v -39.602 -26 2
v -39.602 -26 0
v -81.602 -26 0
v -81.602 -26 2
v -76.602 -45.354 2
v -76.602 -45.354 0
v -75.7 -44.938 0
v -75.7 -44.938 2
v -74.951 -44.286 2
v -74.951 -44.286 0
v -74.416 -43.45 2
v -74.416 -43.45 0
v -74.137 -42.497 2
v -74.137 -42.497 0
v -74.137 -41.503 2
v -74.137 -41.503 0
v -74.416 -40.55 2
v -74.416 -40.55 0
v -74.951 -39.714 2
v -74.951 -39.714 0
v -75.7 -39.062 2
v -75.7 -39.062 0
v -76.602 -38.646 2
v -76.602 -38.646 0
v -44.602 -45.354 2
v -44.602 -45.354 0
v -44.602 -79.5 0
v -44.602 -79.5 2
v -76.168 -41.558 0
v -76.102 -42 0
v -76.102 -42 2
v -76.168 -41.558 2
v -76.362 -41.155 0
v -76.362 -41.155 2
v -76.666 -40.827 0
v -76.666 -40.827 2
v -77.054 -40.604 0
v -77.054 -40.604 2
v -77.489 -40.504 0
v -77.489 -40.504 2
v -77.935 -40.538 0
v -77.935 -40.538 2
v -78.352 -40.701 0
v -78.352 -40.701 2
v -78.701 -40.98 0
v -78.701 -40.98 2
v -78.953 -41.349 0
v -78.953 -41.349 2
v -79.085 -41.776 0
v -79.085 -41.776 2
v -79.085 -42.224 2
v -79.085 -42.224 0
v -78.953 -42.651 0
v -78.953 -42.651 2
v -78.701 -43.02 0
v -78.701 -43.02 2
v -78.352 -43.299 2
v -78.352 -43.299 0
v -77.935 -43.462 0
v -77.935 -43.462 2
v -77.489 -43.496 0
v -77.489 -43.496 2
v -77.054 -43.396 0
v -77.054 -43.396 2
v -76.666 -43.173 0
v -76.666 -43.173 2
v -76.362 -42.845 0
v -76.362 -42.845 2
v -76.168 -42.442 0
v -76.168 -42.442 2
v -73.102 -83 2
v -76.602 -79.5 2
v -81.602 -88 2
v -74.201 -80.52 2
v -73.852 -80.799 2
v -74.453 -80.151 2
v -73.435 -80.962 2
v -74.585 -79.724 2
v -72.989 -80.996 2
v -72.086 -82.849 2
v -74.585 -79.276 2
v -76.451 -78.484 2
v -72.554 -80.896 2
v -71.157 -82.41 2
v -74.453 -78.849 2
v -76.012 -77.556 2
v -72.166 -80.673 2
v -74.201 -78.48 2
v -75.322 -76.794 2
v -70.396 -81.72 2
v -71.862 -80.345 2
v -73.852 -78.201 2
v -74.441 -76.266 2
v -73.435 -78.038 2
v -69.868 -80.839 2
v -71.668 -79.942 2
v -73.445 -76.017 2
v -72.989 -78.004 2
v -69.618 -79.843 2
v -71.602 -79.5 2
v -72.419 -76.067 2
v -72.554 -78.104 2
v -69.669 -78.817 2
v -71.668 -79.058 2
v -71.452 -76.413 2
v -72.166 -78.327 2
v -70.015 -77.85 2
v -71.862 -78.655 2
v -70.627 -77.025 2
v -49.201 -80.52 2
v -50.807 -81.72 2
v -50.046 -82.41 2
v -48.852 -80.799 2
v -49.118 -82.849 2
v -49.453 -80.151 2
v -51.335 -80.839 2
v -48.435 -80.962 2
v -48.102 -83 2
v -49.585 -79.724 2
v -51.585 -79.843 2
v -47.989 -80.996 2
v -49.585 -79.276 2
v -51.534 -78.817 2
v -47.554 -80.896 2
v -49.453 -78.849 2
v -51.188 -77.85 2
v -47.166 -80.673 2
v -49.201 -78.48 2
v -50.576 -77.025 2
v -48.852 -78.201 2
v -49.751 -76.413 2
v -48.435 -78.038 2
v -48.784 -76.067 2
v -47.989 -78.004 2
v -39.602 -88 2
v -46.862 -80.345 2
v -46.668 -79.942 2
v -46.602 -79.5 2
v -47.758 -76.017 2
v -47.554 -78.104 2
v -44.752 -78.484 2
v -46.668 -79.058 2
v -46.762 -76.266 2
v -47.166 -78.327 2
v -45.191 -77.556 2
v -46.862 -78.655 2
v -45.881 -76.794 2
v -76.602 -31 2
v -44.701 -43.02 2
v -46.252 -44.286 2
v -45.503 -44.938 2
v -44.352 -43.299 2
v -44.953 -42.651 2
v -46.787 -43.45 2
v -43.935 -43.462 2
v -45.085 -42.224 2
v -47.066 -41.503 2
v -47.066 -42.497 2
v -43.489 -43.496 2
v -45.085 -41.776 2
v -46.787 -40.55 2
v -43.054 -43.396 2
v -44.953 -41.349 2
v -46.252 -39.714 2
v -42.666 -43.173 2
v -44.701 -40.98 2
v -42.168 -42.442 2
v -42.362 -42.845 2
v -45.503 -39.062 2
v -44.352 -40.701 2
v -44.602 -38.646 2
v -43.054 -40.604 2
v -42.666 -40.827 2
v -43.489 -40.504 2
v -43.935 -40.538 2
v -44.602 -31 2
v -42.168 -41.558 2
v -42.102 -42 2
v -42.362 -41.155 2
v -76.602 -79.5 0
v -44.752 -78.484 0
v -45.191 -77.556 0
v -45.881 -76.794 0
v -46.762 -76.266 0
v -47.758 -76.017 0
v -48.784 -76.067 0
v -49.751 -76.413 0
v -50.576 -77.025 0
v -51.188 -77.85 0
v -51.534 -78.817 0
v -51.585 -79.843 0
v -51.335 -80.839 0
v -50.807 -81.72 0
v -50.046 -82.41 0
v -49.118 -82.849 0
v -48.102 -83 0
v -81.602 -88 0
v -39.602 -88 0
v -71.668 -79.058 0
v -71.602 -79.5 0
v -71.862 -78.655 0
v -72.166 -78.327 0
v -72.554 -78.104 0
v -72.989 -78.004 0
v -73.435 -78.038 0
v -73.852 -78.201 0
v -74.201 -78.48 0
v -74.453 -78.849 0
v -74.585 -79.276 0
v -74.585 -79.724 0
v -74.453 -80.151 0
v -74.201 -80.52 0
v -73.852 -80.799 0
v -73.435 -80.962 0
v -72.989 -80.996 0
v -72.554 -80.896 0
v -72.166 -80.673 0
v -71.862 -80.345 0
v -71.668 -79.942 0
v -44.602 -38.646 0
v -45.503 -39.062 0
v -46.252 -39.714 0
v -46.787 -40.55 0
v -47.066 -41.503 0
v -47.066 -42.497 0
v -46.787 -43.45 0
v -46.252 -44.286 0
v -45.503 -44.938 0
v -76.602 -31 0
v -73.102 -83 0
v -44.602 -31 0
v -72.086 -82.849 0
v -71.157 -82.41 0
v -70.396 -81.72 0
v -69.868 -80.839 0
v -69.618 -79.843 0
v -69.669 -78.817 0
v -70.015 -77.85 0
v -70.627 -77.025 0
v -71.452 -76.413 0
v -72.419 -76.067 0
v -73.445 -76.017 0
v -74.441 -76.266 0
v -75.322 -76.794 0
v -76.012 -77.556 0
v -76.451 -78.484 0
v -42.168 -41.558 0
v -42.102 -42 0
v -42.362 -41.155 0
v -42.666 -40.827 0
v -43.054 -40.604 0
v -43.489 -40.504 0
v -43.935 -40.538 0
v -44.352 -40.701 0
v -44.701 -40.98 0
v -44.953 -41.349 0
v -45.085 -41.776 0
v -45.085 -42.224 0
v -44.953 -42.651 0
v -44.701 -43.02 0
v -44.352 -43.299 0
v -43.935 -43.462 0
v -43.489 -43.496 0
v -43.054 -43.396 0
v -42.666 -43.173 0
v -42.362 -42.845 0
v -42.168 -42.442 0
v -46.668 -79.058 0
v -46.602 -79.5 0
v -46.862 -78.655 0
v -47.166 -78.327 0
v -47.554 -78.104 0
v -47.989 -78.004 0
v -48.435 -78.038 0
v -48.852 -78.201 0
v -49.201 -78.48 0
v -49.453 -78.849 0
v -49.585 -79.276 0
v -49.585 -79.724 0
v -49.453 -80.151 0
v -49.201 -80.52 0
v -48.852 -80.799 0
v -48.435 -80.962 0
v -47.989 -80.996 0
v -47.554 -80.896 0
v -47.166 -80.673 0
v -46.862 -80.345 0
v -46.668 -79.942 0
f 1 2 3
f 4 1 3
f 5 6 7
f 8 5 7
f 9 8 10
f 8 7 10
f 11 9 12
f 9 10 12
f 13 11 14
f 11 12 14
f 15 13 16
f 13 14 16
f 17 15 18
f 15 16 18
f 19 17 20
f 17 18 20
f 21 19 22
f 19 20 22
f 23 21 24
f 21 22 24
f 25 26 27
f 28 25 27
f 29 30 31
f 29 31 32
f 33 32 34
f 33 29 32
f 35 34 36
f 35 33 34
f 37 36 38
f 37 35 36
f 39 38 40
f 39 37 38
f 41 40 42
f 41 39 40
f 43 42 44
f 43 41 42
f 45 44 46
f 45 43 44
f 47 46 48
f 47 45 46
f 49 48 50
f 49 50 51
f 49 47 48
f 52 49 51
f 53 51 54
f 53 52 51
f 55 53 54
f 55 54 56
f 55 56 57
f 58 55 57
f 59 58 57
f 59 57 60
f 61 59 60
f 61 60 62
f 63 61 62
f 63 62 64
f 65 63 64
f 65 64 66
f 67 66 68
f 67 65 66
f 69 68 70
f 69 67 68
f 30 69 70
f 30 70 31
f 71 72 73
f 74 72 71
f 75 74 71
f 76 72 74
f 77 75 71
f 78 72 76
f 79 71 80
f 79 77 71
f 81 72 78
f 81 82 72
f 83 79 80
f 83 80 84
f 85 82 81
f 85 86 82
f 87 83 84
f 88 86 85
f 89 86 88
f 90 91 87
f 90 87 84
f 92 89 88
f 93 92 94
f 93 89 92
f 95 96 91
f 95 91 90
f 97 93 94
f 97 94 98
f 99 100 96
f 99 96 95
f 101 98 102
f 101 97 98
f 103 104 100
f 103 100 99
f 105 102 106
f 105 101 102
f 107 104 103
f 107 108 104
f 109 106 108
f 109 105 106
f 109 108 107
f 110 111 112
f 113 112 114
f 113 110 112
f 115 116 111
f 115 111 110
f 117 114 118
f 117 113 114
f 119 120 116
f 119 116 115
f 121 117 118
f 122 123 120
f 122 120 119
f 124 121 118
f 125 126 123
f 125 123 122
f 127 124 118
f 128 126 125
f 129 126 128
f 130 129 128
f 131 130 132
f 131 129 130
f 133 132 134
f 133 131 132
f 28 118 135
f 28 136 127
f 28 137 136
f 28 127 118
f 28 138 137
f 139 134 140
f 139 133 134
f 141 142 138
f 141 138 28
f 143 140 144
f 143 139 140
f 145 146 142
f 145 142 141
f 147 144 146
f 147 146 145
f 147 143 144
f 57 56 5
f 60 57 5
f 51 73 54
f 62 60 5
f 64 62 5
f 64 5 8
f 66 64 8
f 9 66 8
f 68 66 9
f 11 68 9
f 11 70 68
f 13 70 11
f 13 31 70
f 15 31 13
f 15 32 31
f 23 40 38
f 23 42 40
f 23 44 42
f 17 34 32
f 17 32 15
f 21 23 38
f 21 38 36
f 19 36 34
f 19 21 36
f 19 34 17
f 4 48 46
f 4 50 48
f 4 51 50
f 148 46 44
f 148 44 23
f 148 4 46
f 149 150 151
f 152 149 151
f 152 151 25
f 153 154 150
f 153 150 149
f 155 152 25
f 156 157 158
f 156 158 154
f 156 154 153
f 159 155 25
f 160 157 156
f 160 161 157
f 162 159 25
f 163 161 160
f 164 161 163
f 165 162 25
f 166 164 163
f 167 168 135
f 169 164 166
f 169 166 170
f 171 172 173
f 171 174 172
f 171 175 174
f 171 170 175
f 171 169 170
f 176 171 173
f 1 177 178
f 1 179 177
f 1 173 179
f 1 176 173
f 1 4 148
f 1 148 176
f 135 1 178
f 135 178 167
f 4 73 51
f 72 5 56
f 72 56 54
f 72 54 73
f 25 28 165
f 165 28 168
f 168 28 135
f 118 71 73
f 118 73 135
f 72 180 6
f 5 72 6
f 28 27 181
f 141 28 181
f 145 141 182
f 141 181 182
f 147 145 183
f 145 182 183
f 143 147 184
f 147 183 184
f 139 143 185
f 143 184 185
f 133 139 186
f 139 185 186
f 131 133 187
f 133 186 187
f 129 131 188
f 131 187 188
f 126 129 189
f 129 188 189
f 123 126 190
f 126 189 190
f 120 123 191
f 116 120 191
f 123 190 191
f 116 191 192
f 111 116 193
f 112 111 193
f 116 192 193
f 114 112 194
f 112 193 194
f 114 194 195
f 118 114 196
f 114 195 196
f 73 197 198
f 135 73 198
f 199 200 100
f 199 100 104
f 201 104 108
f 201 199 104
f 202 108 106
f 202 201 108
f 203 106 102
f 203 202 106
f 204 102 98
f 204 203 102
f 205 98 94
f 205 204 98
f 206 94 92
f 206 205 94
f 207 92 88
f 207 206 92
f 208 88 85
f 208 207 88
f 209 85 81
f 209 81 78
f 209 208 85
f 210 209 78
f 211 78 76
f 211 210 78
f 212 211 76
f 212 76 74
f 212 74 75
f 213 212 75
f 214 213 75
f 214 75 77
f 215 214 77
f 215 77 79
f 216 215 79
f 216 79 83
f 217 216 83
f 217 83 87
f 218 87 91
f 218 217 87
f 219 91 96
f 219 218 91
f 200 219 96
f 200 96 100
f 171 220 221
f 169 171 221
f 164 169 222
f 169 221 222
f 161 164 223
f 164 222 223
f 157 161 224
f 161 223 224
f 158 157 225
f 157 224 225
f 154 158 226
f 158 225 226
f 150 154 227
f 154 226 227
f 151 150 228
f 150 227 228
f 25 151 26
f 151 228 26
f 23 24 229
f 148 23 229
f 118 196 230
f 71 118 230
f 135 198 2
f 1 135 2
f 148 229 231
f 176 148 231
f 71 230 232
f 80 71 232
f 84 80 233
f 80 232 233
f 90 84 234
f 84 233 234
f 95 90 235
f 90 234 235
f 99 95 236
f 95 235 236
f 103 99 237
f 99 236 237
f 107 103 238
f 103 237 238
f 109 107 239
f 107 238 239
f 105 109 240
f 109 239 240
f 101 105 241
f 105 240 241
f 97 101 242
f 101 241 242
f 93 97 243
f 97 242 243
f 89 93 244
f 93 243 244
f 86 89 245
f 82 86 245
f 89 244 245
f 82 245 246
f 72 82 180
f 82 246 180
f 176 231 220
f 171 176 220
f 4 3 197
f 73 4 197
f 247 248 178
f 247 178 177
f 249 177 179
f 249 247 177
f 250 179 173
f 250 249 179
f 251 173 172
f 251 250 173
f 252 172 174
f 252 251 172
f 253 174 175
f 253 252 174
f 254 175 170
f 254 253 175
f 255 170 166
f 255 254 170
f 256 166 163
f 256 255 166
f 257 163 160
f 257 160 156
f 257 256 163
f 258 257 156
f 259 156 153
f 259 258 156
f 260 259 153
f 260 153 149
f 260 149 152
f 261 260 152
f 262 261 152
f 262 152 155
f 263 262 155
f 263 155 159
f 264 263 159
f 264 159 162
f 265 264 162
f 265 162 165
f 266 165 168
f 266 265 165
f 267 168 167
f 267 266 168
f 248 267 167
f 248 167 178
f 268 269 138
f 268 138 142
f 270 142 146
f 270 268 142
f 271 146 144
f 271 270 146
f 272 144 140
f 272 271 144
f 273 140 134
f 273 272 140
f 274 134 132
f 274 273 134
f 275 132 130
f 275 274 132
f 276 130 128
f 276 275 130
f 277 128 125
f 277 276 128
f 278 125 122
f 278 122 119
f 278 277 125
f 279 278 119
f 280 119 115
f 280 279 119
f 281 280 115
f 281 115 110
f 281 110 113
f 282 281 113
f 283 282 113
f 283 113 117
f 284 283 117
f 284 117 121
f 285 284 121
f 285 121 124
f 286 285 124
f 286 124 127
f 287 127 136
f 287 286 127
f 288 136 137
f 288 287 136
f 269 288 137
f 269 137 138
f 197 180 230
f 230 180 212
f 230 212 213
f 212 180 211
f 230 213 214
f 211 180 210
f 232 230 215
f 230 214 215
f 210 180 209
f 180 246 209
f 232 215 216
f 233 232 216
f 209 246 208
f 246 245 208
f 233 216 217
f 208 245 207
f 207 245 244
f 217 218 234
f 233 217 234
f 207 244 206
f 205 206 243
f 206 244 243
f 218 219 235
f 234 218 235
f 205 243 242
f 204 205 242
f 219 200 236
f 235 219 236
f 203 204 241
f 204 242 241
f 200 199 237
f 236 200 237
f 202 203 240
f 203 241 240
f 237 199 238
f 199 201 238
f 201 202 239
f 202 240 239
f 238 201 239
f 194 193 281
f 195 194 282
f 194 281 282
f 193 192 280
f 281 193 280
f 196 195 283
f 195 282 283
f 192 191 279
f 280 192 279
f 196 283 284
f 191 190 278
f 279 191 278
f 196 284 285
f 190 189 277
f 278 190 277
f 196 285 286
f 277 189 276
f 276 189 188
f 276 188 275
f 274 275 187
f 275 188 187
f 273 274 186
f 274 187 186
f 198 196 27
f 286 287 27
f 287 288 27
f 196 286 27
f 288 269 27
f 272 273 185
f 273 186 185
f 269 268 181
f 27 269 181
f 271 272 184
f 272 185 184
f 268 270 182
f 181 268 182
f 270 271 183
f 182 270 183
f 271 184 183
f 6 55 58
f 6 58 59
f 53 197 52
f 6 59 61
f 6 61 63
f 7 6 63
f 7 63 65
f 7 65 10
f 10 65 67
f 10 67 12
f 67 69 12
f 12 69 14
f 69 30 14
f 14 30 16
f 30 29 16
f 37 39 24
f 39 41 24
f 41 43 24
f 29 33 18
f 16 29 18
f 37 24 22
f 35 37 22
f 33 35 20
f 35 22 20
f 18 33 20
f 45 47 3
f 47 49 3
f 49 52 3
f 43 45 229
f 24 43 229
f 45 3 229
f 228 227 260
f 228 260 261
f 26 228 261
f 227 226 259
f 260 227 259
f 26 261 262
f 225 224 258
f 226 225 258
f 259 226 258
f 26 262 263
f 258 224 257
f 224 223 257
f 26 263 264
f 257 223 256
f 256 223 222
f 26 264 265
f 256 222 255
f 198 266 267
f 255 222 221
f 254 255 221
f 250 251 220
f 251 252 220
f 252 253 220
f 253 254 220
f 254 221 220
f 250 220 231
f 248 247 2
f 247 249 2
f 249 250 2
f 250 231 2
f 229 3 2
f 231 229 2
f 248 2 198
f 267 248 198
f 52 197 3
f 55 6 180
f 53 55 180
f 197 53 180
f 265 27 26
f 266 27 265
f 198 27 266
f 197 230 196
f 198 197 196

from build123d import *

# Parameters (mm, degrees)
SKETCH1_R           = 3.5
SKETCH1_R_2         = 1.5
BOSS_EXTRUDE1_DEPTH = 2


with BuildPart() as part:
    # Sketch1 → Boss-Extrude1 (new body)
    with BuildSketch(Plane.XY):
        with BuildLine():
            ThreePointArc((-73.101516296, -83), (-75.576390016, -81.974873749), (-76.601516296, -79.500000041))
            Line((-76.601516296, -79.500000041), (-76.601516296, -83))
            Line((-76.601516296, -83), (-73.101516296, -83))
        make_face()
        with Locations((-73.101516296, -79.5)):
            Circle(SKETCH1_R)
        with Locations((-73.101516296, -79.5)):
            Circle(SKETCH1_R_2, mode=Mode.SUBTRACT)
        with BuildLine():
            Line((-44.601516296, -83), (-44.601516296, -79.5))
            ThreePointArc((-44.601516296, -79.5), (-45.626642562, -81.974873734), (-48.101516296, -83))
            Line((-48.101516296, -83), (-44.601516296, -83))
        make_face()
        with Locations((-48.101516296, -79.5)):
            Circle(SKETCH1_R)
        with Locations((-48.101516296, -79.5)):
            Circle(SKETCH1_R_2, mode=Mode.SUBTRACT)
        with BuildLine():
            ThreePointArc((-76.601516296, -50.477288358), (-79.44300278, -53.809155179), (-81.601516296, -57.61916848))
            Line((-81.601516296, -57.61916848), (-81.601516296, -76.38083152))
            ThreePointArc((-81.601516296, -76.38083152), (-76.864972263, -83.263455967), (-69.982347816, -88))
            Line((-69.982347816, -88), (-51.220684776, -88))
            ThreePointArc((-51.220684776, -88), (-44.338060329, -83.263455967), (-39.601516296, -76.38083152))
            Line((-39.601516296, -76.38083152), (-39.601516296, -57.61916848))
            ThreePointArc((-39.601516296, -57.61916848), (-41.760029812, -53.809155179), (-44.601516296, -50.477288358))
            Line((-44.601516296, -50.477288358), (-44.601516296, -79.5))
            Line((-44.601516296, -79.5), (-44.601516296, -83))
            Line((-44.601516296, -83), (-48.101516296, -83))
            Line((-48.101516296, -83), (-73.101516296, -83))
            Line((-73.101516296, -83), (-76.601516296, -83))
            Line((-76.601516296, -83), (-76.601516296, -79.500000041))
            Line((-76.601516296, -79.500000041), (-76.601516296, -50.477288358))
        make_face()
        with BuildLine():
            ThreePointArc((-69.982347816, -88), (-76.864972263, -83.263455967), (-81.601516296, -76.38083152))
            Line((-81.601516296, -76.38083152), (-81.601516296, -88))
            Line((-81.601516296, -88), (-69.982347816, -88))
        make_face()
        with BuildLine():
            Line((-39.601516296, -88), (-39.601516296, -76.38083152))
            ThreePointArc((-39.601516296, -76.38083152), (-44.338060329, -83.263455967), (-51.220684776, -88))
            Line((-51.220684776, -88), (-39.601516296, -88))
        make_face()
        with BuildLine():
            Line((-39.601516296, -26), (-81.601516296, -26))
            Line((-81.601516296, -26), (-81.601516296, -57.61916848))
            ThreePointArc((-81.601516296, -57.61916848), (-79.44300278, -53.809155179), (-76.601516296, -50.477288358))
            Line((-76.601516296, -50.477288358), (-76.601516296, -45.354101966))
            ThreePointArc((-76.601516296, -45.354101966), (-74.101516296, -42), (-76.601516296, -38.645898034))
            Line((-76.601516296, -38.645898034), (-76.601516296, -31))
            Line((-76.601516296, -31), (-44.601516296, -31))
            Line((-44.601516296, -31), (-44.601516296, -38.645898034))
            ThreePointArc((-44.601516296, -38.645898034), (-47.101516296, -42), (-44.601516296, -45.354101966))
            Line((-44.601516296, -45.354101966), (-44.601516296, -50.477288358))
            ThreePointArc((-44.601516296, -50.477288358), (-41.760029812, -53.809155179), (-39.601516296, -57.61916848))
            Line((-39.601516296, -57.61916848), (-39.601516296, -26))
        make_face()
        with Locations((-77.601516296, -42)):
            Circle(SKETCH1_R_2, mode=Mode.SUBTRACT)
        with Locations((-43.601516296, -42)):
            Circle(SKETCH1_R_2, mode=Mode.SUBTRACT)
    extrude(amount=BOSS_EXTRUDE1_DEPTH)


solid = part.part
